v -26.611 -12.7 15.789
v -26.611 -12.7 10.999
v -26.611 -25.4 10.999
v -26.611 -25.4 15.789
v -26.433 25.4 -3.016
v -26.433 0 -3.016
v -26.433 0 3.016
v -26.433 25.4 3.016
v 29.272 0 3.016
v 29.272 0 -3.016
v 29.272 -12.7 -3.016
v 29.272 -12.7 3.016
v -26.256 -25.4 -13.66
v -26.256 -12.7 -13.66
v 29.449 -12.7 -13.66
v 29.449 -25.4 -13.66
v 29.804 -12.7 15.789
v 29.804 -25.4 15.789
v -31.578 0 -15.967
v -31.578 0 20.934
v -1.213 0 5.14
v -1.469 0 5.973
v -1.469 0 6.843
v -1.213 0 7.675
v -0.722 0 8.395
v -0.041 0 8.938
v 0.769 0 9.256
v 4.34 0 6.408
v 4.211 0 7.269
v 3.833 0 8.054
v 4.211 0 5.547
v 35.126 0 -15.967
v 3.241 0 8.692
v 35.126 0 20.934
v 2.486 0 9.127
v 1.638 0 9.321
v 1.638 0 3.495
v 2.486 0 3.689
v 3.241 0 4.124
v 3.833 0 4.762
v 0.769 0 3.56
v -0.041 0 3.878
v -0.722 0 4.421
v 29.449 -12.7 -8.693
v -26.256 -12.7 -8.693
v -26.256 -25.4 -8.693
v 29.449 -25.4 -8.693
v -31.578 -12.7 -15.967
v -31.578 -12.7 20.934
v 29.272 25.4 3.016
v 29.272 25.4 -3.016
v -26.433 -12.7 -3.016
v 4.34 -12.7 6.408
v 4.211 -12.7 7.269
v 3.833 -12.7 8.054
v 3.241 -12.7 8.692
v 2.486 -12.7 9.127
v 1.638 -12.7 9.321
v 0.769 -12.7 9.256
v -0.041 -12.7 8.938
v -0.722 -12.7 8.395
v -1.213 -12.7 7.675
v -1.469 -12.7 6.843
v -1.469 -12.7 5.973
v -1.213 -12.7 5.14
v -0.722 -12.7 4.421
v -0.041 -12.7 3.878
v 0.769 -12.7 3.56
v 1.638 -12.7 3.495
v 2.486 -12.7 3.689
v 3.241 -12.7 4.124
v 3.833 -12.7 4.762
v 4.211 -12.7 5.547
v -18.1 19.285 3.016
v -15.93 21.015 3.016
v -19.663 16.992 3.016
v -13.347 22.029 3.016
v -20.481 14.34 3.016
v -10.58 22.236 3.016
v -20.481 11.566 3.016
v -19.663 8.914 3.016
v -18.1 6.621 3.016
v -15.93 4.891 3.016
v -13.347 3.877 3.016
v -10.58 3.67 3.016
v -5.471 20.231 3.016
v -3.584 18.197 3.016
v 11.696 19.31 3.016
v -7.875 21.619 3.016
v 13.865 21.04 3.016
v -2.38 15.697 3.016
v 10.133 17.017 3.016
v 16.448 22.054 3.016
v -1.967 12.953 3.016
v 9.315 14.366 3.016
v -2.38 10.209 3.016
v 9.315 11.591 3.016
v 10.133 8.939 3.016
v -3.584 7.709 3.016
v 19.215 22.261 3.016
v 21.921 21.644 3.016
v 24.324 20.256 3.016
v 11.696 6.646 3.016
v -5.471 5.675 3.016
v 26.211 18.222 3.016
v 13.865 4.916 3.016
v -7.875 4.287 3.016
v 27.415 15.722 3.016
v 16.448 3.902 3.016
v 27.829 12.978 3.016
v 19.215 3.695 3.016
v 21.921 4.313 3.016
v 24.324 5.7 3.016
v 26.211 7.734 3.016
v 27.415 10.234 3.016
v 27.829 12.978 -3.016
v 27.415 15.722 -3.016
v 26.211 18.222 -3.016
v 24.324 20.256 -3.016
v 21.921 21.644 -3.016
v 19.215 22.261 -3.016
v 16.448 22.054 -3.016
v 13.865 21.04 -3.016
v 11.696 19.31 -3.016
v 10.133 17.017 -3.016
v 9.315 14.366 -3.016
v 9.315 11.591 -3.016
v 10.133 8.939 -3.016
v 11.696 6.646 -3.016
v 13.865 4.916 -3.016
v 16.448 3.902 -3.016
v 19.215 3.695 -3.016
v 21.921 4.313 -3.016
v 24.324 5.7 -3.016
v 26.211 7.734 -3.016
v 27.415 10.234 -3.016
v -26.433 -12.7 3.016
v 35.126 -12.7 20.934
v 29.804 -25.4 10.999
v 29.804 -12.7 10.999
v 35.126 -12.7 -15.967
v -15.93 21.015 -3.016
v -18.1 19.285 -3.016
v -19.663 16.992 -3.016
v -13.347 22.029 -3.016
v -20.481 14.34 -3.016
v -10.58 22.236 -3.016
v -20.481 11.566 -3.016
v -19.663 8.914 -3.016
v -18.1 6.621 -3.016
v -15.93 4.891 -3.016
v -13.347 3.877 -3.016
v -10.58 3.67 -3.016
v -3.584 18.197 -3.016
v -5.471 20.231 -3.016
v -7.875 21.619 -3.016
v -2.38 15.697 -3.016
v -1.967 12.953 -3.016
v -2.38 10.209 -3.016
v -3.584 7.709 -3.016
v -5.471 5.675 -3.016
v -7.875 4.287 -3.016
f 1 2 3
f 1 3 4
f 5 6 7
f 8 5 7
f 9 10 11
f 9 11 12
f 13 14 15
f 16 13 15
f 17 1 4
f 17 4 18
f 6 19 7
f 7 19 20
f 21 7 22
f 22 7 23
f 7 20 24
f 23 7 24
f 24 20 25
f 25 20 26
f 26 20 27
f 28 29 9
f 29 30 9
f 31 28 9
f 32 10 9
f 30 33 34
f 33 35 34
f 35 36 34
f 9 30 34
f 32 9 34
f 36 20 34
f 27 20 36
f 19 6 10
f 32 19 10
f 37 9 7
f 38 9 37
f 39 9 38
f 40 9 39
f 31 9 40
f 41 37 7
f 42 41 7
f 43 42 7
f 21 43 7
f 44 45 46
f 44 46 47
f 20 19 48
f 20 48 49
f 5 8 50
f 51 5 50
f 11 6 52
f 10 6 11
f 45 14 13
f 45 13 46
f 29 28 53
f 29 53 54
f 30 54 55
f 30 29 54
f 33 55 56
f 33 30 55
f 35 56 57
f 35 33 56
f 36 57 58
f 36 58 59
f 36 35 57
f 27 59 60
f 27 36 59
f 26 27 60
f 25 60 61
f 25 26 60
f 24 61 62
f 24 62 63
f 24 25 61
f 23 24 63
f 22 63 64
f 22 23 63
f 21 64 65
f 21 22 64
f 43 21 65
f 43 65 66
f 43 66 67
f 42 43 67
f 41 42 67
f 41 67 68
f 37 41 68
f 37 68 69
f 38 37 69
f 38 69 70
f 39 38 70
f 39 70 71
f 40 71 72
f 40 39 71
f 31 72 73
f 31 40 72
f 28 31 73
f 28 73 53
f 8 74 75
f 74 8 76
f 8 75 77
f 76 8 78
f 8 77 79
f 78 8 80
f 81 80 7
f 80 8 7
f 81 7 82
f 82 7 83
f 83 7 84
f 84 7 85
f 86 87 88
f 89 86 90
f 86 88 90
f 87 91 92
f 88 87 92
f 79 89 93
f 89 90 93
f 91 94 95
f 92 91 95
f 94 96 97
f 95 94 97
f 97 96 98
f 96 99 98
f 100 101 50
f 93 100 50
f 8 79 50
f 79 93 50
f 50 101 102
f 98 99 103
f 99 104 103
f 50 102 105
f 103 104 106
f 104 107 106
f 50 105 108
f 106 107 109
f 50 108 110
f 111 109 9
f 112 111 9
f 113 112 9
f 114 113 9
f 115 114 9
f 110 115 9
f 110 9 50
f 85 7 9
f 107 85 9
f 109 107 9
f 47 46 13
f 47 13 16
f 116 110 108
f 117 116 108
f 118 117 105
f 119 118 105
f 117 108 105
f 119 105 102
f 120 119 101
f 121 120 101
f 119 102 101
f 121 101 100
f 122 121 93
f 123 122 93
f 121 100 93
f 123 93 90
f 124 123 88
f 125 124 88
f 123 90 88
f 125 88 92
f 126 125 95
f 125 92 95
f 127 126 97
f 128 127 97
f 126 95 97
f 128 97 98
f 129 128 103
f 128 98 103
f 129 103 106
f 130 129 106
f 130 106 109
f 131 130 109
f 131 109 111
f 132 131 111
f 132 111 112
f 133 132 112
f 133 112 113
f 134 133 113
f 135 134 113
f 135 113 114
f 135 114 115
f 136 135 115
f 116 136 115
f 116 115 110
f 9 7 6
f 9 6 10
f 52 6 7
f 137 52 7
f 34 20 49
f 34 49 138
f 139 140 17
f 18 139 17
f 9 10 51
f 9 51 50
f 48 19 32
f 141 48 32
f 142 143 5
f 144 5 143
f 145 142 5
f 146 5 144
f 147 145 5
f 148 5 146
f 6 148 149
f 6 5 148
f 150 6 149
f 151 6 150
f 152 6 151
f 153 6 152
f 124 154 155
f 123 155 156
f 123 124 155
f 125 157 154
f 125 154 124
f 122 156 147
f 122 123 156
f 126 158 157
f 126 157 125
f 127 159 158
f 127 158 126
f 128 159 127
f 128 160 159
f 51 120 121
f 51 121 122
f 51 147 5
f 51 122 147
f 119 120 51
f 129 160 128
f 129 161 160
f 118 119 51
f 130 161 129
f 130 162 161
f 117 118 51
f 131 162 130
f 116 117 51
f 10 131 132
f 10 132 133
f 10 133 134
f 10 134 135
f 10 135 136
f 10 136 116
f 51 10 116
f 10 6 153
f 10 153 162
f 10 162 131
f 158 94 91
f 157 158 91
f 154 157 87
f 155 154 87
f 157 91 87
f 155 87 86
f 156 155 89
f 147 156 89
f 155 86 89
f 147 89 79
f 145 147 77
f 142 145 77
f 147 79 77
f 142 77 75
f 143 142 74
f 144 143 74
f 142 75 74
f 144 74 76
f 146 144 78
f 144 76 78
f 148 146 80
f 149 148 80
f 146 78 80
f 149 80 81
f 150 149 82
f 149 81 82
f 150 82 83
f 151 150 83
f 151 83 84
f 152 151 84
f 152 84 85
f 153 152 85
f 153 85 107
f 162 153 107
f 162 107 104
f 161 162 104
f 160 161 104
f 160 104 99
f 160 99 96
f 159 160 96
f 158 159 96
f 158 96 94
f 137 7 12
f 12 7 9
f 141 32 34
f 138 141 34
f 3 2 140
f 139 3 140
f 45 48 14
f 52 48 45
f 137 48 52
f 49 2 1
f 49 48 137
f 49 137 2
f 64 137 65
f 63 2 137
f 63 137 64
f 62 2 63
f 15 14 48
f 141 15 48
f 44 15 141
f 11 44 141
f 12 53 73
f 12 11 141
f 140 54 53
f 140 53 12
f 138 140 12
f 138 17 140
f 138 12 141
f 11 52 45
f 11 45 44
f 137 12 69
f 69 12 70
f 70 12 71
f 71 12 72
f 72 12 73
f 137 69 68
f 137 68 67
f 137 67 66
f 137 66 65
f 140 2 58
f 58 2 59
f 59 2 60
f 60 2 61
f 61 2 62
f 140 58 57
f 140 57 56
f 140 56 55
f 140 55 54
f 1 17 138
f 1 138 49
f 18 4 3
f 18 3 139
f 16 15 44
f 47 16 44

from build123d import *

# Parameters (mm, degrees)
F0_W     = 66.7045712471
F0_H     = 36.9003992528
F0_W_2   = 55.7054132223
F0_H_2   = 4.9673607573
F0_W_3   = 55.705409497
F0_H_3   = 6.0317961033
F0_R     = 2.9212433218
F0_W_4   = 56.415034458
F0_H_4   = 4.789955914
F1_DEPTH = 12.7
F2_DEPTH = 25.4
F3_DEPTH = 25.4
F4_R     = 9.3091
F5_DEPTH = 25.4
F6_DEPTH = 7.12812


with BuildPart() as f1:
    # F0 (on Front) → F1 (new body)
    with BuildSketch(Plane.XZ):
        with Locations((1.7740577459, 2.483679913)):
            Rectangle(F0_W, F0_H)
        with Locations((1.596653834, -11.1765633337)):
            Rectangle(F0_W_2, F0_H_2, mode=Mode.SUBTRACT)
        with Locations((1.4192461967, 1.164e-07)):
            Rectangle(F0_W_3, F0_H_3, mode=Mode.SUBTRACT)
        with Locations((1.4192461967, 6.4079510048)):
            Circle(F0_R, mode=Mode.SUBTRACT)
        with Locations((1.5966529027, 13.3941359818)):
            Rectangle(F0_W_4, F0_H_4, mode=Mode.SUBTRACT)
    extrude(amount=F1_DEPTH)

    # F0 (on Front) → F2 (join)
    with BuildSketch(Plane.XZ):
        with Locations((1.5966529027, 13.3941359818)):
            Rectangle(F0_W_4, F0_H_4)
        with Locations((1.596653834, -11.1765633337)):
            Rectangle(F0_W_2, F0_H_2)
    extrude(amount=F2_DEPTH)

    # F0 (on Front) → F6 (cut)
    with BuildSketch(Plane.XZ):
        with Locations((1.4192461967, 6.4079510048)):
            Circle(F0_R)
    extrude(amount=-F6_DEPTH, mode=Mode.SUBTRACT)


with BuildPart() as f3:
    # F0 (on Front) → F3 (new body)
    with BuildSketch(Plane.XZ):
        with Locations((1.4192461967, 1.164e-07)):
            Rectangle(F0_W_3, F0_H_3)
    extrude(amount=-F3_DEPTH)

    # F4 (on face) → F5 (cut)
    with BuildSketch(Plane.XY.offset(3.0158981681)):
        with Locations((18.5197732105, 12.978198365)):
            Circle(F4_R)
        with Locations((-11.2756254383, 12.9530187696)):
            Circle(F4_R)
    extrude(amount=-F5_DEPTH, mode=Mode.SUBTRACT)


solid = Compound([f1.part, f3.part])
